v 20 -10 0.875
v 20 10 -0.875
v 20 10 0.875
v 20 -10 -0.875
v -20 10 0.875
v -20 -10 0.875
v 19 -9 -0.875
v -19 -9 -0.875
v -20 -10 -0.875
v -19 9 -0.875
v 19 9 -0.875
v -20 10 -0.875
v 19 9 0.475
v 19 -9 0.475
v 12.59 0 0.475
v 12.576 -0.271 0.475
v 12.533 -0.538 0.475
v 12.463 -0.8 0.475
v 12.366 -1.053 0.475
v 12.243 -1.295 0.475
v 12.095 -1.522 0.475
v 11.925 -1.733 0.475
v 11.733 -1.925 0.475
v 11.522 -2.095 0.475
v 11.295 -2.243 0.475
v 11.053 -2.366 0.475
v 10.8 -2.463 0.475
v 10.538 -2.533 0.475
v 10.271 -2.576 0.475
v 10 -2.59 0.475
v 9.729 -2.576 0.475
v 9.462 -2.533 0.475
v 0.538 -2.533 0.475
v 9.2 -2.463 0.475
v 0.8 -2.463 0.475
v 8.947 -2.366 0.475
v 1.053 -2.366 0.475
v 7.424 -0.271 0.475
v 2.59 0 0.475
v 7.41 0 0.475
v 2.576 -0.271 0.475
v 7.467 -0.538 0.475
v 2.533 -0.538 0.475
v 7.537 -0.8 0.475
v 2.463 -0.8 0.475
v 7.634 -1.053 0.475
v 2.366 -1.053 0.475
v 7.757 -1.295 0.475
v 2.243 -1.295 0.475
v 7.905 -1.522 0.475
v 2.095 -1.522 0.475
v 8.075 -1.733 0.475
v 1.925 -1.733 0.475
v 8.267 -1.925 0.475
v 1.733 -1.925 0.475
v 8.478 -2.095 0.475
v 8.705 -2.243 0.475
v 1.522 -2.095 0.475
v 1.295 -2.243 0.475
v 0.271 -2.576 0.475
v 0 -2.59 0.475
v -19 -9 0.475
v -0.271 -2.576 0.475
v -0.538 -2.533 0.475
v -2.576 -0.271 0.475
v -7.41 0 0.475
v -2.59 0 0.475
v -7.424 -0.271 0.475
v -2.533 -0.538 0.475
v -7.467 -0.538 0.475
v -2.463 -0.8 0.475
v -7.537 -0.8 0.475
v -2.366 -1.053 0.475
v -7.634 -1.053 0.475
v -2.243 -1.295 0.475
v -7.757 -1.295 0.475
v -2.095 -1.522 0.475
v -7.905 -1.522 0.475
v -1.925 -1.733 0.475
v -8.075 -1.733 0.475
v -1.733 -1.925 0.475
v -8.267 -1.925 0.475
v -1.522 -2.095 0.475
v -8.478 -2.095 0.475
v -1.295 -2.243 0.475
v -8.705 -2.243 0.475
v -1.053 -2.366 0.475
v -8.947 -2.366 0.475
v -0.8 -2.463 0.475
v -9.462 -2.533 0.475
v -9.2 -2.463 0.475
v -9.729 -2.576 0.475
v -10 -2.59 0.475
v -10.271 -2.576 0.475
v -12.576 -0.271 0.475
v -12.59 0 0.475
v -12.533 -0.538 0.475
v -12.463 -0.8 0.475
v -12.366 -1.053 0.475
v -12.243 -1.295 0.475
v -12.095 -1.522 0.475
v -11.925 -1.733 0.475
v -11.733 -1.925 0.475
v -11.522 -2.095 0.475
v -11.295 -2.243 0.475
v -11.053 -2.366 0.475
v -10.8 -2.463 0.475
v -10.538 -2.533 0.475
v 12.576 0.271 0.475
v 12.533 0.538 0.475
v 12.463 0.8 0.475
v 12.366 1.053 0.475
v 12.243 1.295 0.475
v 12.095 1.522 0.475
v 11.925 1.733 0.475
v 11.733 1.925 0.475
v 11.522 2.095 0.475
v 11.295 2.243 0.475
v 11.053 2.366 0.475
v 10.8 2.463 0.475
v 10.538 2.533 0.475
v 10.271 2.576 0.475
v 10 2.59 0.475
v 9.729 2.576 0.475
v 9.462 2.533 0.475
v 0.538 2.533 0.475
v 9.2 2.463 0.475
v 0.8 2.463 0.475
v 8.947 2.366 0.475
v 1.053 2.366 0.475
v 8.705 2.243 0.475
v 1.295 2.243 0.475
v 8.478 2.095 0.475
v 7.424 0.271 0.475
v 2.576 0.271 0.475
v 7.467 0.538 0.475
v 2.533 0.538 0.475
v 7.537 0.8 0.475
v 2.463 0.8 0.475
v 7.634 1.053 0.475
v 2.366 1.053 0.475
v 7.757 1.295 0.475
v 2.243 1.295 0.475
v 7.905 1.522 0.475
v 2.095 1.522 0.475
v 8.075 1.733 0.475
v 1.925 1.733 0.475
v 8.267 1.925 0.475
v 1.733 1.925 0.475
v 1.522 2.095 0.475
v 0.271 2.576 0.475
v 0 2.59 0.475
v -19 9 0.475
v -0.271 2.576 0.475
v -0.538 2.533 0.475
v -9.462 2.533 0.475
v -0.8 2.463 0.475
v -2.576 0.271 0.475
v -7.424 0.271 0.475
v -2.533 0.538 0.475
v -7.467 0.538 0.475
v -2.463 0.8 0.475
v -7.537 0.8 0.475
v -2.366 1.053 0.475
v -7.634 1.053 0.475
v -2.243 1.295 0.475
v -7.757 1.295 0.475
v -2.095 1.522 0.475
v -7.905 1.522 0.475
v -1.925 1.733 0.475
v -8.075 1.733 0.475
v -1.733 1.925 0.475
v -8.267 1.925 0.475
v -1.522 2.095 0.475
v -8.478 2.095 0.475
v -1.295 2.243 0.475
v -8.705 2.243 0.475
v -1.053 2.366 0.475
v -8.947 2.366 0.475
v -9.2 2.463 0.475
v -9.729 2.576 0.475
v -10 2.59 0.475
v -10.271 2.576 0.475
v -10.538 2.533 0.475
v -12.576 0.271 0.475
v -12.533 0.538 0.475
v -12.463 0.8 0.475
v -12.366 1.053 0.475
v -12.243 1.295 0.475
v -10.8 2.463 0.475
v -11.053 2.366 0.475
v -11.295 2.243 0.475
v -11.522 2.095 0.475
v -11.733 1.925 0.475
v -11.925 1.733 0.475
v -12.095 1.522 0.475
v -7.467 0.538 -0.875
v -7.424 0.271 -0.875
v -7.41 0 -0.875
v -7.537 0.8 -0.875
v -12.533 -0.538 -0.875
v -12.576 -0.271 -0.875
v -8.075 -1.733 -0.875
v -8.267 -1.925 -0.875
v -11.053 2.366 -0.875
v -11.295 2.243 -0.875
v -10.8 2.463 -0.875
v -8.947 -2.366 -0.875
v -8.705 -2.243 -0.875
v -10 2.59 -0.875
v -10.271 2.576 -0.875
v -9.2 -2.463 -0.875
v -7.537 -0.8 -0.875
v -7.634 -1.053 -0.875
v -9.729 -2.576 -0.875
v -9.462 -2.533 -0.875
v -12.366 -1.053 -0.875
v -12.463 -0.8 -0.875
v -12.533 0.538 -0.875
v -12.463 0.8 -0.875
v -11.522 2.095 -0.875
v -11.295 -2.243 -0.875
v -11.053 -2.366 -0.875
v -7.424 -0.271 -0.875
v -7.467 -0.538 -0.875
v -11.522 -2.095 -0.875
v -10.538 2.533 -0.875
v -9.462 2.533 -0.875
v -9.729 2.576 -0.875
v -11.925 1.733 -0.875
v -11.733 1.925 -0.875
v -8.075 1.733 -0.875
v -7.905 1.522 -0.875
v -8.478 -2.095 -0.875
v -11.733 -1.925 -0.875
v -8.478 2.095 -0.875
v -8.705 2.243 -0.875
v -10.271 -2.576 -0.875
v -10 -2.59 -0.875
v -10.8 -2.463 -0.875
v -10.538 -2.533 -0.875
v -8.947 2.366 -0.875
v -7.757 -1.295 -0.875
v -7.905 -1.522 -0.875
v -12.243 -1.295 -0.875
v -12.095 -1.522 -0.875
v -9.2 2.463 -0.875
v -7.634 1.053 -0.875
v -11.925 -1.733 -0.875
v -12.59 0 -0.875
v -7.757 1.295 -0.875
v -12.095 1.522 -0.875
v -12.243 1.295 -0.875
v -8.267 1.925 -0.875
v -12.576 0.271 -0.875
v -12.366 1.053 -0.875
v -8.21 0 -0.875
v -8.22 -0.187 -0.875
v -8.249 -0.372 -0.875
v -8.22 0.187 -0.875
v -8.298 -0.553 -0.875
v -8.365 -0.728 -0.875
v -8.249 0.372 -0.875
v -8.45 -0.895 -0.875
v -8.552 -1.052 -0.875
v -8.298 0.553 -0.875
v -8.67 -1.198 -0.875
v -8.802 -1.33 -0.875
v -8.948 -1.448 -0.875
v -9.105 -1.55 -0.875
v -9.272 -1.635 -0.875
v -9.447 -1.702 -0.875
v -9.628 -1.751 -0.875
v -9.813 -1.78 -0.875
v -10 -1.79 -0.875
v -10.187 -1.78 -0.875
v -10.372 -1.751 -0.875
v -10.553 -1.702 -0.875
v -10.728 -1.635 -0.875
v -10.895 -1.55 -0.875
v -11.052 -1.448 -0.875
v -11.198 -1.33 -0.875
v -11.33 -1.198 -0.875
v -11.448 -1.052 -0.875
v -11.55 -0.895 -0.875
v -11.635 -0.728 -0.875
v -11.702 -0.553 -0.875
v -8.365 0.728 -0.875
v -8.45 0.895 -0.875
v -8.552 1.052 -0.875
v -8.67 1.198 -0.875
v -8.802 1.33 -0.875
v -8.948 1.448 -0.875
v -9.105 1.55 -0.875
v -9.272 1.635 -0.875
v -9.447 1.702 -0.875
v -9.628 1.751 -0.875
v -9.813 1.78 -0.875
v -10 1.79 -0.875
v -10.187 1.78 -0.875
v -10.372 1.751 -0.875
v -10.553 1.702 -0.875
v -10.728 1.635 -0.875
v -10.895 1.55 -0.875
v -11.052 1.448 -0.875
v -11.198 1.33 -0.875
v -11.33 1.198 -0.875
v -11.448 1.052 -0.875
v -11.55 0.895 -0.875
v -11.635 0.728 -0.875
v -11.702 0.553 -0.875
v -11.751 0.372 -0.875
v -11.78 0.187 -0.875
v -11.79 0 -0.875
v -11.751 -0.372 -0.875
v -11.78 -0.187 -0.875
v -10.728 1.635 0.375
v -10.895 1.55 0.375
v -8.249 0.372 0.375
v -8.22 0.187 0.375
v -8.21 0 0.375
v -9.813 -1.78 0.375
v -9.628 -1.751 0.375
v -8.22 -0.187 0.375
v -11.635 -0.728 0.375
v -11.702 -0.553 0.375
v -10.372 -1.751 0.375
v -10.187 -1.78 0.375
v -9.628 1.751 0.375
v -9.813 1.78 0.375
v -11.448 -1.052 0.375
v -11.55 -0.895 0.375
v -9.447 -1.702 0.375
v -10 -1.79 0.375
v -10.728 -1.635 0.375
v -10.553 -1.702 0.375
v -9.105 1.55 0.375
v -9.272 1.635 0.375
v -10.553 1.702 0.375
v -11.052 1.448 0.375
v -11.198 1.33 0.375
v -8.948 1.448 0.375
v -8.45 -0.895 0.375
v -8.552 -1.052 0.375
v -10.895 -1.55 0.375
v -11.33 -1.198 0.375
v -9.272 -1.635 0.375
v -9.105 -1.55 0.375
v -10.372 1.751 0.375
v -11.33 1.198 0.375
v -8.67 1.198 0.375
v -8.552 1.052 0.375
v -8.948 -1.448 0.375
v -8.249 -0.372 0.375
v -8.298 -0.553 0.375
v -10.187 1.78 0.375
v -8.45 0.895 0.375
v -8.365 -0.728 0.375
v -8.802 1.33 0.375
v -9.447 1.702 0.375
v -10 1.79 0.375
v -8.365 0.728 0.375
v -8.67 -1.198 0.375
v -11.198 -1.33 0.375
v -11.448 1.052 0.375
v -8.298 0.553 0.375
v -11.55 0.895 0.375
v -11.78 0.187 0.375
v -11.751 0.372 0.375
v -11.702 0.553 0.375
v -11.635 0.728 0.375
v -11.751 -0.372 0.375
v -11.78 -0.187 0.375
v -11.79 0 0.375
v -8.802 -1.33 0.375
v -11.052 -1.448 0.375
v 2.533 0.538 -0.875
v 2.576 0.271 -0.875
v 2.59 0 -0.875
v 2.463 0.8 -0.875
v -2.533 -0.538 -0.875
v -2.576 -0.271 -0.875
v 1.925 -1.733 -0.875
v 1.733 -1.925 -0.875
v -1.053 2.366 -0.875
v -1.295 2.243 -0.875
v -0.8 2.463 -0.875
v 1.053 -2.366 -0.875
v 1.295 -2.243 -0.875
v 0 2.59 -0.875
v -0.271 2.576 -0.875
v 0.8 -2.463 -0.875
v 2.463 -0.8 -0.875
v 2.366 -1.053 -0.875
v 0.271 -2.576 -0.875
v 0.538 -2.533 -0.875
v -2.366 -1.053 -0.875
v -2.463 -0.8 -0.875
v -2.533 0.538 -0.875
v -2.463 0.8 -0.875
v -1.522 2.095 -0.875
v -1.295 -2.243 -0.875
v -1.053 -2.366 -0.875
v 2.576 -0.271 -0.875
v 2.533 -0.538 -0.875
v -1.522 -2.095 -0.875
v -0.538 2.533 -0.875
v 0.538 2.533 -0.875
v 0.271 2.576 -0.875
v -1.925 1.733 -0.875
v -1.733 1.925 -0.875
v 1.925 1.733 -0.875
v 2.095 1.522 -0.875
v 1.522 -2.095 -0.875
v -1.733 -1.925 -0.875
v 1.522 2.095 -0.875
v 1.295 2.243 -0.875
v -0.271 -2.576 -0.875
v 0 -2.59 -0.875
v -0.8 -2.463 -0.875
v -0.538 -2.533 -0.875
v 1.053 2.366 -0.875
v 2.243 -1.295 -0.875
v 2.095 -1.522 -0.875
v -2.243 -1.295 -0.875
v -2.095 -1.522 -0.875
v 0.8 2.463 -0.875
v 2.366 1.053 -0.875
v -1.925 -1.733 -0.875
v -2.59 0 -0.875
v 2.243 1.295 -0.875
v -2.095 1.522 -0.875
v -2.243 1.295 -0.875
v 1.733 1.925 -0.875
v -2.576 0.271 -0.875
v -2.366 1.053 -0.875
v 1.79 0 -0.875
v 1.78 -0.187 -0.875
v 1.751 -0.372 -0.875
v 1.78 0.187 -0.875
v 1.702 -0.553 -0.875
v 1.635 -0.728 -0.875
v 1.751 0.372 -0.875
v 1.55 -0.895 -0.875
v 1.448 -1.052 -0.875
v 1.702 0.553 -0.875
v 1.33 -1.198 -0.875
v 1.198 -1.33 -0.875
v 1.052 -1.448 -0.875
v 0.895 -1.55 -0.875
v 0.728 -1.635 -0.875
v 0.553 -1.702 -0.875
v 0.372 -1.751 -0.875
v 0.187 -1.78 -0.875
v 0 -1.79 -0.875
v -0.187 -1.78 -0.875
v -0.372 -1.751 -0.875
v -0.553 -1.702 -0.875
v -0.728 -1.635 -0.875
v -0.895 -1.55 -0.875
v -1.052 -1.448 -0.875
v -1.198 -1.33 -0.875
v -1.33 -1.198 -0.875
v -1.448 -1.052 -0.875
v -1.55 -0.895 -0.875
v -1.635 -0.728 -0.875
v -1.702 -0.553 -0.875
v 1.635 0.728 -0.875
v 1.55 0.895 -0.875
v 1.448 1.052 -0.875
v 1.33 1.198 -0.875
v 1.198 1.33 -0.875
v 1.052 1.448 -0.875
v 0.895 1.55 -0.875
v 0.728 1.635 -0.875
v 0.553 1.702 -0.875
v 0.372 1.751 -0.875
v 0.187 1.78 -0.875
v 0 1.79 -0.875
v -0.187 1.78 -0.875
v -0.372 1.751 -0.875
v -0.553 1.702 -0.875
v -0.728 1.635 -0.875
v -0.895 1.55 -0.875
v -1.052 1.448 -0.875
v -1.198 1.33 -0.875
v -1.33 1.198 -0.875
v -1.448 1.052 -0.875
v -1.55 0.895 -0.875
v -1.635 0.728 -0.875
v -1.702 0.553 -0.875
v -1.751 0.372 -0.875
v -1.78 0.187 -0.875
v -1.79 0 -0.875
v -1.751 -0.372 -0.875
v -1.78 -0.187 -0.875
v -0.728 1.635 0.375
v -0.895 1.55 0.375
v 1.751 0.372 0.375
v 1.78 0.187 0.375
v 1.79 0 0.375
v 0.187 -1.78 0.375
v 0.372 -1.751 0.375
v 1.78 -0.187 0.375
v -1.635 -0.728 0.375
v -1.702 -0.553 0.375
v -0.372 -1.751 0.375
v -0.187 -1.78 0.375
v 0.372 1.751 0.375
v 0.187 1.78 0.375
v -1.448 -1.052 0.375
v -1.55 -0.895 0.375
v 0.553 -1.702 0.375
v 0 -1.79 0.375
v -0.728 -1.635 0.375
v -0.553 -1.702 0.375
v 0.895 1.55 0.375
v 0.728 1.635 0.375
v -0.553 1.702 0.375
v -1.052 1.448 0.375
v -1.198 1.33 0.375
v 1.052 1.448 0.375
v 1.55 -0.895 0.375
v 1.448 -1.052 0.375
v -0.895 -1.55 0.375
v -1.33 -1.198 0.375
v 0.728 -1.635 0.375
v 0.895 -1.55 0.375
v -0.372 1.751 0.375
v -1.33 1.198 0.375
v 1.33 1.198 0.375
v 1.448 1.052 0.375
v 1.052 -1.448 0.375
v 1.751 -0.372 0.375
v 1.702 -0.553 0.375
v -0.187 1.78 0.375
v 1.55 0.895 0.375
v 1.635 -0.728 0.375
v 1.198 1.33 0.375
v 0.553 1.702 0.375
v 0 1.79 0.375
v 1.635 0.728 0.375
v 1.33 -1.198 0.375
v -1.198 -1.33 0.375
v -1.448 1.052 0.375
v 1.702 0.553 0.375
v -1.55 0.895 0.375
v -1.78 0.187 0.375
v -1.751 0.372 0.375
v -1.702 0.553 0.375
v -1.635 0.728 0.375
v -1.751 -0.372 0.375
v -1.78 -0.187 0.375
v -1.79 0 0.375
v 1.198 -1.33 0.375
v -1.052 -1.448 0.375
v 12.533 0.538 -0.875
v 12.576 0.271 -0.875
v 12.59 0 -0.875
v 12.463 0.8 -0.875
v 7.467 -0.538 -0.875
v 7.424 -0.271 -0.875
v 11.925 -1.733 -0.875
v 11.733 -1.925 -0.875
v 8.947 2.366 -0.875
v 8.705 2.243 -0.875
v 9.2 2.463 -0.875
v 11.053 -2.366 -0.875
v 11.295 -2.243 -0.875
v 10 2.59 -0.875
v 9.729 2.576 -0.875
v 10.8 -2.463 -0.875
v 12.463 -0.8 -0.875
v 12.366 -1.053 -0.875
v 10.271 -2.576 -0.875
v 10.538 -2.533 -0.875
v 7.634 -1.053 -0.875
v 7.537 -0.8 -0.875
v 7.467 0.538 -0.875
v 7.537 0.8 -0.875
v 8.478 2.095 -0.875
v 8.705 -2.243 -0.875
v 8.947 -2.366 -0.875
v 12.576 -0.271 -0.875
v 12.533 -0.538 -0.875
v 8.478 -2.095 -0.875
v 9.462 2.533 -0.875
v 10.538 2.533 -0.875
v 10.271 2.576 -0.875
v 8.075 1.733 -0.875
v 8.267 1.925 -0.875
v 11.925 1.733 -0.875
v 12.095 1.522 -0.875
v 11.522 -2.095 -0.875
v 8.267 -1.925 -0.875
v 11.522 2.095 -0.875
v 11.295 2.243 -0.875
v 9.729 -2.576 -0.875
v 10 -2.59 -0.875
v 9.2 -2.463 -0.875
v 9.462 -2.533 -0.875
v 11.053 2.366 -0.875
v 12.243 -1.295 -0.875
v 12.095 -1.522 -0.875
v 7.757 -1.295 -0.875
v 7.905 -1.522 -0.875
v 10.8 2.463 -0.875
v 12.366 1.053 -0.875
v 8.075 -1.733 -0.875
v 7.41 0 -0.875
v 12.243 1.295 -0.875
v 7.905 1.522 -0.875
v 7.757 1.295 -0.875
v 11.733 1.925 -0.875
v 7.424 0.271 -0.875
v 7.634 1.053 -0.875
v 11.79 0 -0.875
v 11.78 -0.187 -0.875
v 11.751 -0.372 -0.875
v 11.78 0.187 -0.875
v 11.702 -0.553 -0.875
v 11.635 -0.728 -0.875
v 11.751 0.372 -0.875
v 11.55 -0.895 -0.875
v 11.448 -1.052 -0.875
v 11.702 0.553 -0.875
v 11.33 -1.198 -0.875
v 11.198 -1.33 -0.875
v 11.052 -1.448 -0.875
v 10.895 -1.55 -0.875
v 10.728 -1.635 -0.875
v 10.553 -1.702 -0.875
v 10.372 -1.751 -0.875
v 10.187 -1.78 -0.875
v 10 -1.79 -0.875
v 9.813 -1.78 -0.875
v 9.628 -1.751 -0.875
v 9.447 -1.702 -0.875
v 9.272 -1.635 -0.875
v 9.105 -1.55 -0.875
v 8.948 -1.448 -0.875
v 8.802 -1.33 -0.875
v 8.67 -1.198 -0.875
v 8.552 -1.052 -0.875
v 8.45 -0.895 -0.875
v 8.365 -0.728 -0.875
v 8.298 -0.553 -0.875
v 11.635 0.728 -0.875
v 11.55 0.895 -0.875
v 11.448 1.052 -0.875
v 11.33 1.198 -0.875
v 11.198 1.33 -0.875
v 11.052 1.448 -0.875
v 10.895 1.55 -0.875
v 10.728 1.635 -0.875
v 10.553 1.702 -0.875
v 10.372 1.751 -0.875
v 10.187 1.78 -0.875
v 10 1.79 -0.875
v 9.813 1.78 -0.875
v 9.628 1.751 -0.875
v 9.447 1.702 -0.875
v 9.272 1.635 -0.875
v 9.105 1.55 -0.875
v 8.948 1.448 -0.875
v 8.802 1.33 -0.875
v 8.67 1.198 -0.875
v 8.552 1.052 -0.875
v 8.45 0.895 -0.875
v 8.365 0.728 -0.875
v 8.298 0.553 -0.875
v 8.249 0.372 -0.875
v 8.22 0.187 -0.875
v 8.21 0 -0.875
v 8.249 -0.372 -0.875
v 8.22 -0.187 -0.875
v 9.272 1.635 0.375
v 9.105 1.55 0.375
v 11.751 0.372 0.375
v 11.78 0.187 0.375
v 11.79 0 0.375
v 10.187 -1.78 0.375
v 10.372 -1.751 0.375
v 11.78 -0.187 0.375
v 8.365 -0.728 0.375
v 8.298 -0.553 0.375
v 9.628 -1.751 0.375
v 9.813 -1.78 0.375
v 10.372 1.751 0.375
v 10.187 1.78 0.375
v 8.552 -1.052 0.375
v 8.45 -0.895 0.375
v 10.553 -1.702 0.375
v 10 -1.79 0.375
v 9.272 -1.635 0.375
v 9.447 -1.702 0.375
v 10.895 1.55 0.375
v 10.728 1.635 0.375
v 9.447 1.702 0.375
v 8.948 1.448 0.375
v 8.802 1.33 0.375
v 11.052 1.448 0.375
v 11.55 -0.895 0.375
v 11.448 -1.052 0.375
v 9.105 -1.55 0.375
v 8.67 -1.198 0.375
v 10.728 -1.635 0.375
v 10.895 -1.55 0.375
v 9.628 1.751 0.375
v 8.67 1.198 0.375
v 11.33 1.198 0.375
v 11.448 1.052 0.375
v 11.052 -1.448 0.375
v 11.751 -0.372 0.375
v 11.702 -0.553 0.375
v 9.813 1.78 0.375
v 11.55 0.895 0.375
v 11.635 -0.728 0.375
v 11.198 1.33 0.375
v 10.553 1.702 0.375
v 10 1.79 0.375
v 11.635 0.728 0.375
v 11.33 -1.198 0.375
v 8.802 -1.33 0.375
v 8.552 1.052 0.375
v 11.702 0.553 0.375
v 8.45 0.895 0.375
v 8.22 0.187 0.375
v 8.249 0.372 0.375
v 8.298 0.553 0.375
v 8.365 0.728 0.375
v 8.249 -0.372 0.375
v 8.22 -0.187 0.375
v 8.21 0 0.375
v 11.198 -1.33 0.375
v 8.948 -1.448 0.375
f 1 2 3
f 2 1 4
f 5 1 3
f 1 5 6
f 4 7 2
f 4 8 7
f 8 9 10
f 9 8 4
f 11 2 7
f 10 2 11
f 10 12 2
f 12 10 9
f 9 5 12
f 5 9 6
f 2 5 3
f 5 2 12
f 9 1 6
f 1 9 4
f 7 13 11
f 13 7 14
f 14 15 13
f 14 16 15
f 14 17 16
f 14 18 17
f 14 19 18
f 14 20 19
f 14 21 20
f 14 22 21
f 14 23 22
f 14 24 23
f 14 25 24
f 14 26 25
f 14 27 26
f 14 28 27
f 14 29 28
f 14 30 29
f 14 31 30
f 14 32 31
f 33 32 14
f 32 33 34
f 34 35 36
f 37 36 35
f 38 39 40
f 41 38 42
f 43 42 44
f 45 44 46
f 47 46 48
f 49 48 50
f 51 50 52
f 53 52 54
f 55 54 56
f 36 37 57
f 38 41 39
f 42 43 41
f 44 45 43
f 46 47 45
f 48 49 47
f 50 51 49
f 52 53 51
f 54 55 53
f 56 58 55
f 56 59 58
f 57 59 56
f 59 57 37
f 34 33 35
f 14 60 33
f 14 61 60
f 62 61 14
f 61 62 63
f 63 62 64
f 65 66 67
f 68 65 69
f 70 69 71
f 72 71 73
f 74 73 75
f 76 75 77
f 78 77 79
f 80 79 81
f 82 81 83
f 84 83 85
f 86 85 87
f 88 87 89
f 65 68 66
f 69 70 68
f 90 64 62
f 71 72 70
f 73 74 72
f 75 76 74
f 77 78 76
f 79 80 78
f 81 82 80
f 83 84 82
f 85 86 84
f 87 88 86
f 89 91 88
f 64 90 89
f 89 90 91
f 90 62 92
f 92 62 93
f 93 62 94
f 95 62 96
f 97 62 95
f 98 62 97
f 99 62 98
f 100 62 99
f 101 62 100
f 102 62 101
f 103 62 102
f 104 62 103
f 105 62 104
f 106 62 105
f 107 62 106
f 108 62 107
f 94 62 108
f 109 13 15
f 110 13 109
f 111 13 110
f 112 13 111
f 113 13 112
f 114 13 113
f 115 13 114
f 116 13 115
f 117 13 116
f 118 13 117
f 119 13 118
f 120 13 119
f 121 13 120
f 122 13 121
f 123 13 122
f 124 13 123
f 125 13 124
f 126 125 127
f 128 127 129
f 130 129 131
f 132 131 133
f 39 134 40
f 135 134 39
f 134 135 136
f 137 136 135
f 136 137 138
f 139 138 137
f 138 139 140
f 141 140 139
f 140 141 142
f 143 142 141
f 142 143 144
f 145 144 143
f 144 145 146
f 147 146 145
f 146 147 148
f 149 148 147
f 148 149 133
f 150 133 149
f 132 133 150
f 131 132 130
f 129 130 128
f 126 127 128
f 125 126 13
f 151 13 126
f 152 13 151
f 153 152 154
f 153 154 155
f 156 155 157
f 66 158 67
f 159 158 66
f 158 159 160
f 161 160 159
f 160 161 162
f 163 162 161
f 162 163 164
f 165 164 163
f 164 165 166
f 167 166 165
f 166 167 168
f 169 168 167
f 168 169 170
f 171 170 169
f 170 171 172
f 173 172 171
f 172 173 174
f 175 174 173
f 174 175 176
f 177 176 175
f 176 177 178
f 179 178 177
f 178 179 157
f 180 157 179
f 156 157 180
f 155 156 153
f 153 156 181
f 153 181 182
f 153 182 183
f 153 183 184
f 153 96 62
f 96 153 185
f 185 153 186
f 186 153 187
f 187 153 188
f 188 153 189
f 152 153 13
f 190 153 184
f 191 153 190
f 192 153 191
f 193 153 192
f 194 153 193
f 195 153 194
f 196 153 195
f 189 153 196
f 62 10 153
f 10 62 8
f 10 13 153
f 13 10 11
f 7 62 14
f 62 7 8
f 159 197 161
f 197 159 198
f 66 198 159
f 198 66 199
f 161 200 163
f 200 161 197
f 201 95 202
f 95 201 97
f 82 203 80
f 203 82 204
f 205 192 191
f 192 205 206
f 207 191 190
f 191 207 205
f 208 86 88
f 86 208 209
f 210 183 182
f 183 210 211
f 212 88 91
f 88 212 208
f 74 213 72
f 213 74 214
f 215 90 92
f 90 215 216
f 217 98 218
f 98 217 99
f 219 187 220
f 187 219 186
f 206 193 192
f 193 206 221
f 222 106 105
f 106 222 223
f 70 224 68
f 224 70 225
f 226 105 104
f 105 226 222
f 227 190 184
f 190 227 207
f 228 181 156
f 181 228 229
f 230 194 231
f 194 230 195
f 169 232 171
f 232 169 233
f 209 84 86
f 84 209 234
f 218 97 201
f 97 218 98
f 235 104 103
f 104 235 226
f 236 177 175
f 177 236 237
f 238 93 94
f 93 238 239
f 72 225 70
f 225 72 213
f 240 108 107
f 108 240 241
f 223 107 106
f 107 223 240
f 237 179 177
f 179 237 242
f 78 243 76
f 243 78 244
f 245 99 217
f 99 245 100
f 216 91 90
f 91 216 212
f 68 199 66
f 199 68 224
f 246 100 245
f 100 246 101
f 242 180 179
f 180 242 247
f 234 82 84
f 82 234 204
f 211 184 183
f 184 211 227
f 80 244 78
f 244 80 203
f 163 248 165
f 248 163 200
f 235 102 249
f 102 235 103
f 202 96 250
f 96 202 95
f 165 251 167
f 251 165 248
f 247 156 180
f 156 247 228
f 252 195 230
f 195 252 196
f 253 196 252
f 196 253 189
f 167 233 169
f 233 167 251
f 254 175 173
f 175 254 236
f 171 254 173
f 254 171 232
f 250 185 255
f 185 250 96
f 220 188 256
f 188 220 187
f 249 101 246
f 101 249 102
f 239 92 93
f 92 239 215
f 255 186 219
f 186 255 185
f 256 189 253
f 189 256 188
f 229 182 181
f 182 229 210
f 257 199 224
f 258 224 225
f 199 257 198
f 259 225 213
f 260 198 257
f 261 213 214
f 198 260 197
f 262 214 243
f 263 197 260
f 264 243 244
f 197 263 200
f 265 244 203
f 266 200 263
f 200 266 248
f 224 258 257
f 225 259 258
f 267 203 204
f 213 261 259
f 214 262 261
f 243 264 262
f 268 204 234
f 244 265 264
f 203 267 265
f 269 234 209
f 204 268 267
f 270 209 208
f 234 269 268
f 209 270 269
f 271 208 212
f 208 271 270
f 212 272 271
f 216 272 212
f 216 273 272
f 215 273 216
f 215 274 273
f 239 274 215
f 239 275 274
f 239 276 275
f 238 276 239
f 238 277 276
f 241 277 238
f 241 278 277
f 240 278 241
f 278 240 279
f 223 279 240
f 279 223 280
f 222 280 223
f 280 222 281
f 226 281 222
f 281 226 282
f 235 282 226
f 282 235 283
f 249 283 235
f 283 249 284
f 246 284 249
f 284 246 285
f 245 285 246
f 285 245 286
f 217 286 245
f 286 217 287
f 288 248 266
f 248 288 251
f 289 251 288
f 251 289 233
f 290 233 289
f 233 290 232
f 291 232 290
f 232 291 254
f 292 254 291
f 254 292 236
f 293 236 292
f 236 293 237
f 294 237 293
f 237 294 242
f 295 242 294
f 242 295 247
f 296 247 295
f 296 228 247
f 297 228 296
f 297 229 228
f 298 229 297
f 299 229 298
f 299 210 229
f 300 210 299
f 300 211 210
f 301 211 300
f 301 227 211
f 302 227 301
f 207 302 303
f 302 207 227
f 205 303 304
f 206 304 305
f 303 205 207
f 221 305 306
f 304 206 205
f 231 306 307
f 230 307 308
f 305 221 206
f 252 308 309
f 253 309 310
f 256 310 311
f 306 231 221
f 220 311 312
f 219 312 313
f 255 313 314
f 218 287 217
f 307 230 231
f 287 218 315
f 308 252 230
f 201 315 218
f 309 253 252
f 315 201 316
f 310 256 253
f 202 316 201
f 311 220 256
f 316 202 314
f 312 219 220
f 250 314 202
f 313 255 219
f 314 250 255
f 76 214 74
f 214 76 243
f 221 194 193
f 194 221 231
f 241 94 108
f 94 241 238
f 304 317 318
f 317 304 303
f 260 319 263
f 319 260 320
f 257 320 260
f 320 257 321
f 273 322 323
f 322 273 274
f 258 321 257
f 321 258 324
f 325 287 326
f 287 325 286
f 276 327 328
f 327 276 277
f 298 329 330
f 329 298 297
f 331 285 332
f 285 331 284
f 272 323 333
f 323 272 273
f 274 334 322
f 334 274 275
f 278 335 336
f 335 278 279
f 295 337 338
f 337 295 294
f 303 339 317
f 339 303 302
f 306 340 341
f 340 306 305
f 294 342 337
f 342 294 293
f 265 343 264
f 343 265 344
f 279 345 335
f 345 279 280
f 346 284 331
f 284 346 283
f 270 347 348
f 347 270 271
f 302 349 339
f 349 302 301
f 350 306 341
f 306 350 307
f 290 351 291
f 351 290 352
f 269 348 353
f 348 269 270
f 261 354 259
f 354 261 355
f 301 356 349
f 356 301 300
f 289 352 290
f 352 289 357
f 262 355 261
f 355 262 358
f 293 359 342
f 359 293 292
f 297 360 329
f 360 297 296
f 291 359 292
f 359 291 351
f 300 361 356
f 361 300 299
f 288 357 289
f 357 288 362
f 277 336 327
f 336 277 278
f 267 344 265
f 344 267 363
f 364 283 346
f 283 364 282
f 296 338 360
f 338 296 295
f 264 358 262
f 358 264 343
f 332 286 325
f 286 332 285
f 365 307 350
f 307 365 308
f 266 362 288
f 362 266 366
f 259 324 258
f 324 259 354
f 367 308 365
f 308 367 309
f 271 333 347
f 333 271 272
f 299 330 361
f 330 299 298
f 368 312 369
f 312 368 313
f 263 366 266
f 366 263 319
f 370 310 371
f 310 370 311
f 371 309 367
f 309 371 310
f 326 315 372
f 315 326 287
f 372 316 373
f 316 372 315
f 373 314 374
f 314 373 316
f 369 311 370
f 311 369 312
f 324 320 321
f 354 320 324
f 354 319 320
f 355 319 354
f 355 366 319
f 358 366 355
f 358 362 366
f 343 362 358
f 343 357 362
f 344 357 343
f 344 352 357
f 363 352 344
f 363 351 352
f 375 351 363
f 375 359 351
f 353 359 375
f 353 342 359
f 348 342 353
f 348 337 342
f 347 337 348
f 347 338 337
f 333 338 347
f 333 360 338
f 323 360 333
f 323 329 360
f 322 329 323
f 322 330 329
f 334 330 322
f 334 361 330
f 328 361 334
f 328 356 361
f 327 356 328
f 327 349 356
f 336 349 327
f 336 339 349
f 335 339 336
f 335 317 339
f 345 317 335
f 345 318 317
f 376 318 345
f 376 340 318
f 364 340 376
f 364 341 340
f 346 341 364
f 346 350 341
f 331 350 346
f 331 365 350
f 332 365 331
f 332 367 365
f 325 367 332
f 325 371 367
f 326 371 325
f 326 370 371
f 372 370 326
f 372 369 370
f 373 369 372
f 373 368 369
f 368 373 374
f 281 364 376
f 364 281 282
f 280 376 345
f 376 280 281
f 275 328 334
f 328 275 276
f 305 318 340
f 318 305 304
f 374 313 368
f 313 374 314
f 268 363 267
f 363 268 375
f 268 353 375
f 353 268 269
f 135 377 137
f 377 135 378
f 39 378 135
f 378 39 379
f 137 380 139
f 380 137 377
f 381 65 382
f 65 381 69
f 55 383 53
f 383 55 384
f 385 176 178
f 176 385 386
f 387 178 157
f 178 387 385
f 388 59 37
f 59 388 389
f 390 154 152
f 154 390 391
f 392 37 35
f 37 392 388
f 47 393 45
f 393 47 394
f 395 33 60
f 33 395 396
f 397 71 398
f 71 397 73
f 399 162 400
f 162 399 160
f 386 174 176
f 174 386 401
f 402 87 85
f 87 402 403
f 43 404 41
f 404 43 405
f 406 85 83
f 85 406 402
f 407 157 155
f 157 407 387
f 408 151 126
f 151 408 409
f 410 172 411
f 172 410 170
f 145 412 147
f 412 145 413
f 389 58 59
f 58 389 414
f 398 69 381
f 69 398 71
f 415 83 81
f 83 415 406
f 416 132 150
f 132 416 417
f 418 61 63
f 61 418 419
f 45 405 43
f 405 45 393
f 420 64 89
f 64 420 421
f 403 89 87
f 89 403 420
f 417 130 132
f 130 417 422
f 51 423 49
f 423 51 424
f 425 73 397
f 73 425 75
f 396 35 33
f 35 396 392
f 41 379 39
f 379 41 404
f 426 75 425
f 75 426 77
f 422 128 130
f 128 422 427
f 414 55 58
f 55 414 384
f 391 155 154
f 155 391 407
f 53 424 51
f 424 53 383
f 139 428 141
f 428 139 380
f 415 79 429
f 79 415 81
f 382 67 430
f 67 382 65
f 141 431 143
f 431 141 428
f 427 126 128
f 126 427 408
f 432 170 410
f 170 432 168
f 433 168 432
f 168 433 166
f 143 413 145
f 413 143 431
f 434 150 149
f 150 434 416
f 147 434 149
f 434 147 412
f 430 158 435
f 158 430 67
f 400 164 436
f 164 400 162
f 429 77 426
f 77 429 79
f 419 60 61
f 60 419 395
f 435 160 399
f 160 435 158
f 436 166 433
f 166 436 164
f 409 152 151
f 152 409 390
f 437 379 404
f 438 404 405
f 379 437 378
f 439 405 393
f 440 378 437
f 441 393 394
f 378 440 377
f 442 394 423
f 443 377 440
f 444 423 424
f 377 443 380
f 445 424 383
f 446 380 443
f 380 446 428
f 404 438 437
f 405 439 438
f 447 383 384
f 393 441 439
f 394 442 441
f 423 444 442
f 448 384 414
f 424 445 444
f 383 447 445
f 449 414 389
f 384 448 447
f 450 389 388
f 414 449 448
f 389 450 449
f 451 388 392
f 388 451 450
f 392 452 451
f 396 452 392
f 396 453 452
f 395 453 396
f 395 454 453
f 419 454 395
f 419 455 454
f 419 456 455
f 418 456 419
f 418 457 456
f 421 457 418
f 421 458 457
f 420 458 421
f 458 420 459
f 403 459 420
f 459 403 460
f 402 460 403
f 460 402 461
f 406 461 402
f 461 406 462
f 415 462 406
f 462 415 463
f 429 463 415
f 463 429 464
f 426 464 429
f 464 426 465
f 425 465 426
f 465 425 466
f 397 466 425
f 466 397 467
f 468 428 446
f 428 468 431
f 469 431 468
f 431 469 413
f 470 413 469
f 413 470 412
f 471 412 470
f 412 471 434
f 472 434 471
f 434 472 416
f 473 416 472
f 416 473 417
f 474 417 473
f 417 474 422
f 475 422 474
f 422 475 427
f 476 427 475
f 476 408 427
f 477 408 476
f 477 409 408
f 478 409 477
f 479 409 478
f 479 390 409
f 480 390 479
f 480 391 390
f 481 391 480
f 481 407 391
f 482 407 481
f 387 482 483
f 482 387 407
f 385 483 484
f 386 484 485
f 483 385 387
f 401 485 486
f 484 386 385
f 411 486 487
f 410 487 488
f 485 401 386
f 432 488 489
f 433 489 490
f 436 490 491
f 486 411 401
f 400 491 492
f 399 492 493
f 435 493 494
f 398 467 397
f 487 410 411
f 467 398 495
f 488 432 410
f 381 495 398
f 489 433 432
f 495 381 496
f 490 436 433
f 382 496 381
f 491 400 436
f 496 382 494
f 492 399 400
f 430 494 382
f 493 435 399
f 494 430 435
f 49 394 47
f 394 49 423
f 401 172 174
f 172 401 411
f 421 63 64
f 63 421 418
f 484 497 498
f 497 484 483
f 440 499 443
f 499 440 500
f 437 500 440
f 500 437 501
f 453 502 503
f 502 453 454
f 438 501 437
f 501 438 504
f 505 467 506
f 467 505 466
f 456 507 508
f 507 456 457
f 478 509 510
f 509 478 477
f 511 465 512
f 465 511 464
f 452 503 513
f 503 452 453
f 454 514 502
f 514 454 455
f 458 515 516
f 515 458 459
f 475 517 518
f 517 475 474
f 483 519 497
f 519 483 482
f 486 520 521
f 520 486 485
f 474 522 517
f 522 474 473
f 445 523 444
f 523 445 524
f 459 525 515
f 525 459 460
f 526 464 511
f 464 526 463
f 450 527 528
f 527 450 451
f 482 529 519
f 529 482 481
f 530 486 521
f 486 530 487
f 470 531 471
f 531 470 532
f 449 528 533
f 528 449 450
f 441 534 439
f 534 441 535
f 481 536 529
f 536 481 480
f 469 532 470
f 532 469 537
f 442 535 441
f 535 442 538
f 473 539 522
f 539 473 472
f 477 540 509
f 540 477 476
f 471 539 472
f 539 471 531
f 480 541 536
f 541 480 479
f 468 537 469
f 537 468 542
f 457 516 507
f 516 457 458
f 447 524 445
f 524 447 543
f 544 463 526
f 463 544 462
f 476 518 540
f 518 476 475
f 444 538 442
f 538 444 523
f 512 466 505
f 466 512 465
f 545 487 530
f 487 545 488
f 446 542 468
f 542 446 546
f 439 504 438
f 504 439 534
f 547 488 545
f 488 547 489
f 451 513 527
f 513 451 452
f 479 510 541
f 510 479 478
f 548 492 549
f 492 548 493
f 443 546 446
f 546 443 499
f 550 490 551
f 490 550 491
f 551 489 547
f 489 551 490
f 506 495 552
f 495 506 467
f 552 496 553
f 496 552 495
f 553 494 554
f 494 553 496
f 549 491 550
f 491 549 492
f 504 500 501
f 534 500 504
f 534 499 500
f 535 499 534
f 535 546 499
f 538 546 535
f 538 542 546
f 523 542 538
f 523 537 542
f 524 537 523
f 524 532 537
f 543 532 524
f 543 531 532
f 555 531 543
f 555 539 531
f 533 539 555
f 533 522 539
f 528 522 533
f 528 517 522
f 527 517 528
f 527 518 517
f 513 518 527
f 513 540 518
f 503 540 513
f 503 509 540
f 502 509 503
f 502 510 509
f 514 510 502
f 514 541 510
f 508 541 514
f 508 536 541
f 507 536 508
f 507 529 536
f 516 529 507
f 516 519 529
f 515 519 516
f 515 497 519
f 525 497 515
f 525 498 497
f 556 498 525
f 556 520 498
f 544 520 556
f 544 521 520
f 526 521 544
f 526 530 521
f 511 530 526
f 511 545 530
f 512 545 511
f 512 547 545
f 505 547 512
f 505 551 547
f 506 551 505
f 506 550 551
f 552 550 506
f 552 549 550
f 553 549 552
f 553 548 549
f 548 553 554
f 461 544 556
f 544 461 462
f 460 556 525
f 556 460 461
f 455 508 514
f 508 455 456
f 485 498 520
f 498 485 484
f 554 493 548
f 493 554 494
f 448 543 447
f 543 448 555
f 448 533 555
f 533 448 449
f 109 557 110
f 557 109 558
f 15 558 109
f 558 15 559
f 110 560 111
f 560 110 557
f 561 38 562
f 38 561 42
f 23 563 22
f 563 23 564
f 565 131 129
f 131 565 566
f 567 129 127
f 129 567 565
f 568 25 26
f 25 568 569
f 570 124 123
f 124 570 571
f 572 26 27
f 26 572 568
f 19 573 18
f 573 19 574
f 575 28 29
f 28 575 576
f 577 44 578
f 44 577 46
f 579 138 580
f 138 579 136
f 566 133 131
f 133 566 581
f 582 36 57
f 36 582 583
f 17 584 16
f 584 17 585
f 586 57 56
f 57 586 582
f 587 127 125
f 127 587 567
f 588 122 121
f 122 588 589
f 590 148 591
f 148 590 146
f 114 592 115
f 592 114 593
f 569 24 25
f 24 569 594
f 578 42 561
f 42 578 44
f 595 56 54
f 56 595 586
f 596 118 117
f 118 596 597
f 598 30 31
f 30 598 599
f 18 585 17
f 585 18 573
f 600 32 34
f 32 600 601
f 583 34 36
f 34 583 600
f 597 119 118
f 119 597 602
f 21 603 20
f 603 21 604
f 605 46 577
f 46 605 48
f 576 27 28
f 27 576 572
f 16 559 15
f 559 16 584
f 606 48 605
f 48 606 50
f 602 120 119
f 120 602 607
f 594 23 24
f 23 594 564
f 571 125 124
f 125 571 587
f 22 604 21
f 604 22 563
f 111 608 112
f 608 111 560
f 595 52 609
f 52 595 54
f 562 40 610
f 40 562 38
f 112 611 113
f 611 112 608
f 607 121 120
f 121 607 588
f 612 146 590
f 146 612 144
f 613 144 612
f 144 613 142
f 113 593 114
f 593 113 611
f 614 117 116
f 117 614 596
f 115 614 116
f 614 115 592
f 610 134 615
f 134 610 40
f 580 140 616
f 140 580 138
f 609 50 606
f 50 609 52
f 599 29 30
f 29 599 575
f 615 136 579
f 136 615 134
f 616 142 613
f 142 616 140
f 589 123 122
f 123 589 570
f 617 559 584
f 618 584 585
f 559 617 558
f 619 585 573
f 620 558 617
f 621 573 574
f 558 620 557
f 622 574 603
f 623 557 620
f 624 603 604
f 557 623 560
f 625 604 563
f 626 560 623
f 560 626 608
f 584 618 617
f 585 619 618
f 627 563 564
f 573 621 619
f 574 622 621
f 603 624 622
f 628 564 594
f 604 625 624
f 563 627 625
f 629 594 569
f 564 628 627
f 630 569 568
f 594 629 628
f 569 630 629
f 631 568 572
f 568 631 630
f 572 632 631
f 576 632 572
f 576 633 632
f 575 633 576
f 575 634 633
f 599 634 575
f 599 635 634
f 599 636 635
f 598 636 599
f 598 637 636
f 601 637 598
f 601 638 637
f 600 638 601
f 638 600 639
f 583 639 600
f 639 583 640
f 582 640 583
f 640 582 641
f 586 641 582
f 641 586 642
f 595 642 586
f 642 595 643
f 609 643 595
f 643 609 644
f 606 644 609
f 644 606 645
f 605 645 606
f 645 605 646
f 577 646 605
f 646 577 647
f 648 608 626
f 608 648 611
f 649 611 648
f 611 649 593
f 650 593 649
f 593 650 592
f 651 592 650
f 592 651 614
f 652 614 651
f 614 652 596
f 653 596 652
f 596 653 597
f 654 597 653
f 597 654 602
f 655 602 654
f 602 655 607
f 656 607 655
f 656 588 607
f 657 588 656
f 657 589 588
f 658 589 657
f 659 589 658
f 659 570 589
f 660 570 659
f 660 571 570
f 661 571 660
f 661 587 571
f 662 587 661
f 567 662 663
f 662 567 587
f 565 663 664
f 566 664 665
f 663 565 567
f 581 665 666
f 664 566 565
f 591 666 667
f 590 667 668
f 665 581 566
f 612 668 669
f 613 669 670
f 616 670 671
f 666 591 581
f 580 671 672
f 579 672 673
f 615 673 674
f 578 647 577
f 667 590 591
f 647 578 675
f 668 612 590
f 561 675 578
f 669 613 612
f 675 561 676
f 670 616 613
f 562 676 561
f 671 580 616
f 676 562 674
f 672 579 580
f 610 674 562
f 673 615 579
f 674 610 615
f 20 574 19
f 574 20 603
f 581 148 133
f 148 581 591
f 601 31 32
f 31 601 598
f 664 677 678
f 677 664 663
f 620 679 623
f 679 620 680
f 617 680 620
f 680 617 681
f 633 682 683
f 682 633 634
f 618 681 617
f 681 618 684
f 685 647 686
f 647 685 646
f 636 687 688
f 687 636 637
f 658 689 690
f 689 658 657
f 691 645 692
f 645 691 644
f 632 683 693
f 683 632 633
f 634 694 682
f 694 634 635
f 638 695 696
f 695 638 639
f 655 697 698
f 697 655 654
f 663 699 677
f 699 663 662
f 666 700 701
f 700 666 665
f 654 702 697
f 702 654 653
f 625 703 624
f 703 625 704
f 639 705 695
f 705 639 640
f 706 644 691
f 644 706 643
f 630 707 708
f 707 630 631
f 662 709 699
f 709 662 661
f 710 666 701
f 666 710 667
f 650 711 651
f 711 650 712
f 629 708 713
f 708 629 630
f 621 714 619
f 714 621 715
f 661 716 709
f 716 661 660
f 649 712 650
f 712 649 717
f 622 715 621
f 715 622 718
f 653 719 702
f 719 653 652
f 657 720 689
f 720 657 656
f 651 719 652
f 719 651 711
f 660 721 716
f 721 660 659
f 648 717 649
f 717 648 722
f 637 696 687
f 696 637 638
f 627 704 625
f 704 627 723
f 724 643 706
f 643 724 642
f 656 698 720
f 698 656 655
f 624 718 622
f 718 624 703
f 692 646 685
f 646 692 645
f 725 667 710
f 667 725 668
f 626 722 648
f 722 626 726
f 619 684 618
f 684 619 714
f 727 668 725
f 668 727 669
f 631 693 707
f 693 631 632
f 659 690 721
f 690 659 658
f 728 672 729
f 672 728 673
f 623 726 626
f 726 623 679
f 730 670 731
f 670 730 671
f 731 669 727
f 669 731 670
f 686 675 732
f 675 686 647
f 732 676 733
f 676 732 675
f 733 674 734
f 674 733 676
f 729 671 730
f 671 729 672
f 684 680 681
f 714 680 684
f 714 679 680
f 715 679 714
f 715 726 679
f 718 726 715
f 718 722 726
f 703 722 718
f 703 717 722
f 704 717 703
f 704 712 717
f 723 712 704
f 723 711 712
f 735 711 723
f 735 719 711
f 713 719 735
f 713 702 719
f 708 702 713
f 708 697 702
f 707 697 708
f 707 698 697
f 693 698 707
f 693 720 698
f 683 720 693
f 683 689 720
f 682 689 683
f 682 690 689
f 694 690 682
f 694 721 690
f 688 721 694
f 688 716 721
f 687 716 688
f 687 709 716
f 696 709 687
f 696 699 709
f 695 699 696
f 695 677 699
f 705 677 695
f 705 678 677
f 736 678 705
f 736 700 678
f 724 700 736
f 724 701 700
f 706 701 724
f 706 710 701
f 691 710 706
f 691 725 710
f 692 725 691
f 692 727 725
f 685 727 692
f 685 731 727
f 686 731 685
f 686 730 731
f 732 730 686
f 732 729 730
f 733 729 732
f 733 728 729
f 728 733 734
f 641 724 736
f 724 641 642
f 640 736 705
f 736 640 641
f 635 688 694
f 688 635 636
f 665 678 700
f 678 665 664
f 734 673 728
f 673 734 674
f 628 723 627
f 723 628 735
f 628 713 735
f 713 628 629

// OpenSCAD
//
// bases/warhammer_fantasy_no_bevel.scad

// Copyright (C) 2025 John Mettraux jmettraux@gmail.com
//
// This work is licensed under the
// Creative Commons Attribution 4.0 International License.
//
// https://creativecommons.org/licenses/by/4.0/

$fn = 60;
//$fn = 120;
//$fn = 240;
  // circle facet count, set to 120 or 360 for "round"

// unit is millimeter (except for the size variable)

length = 40;
width = 20;
height = 1.4 + 0.35;
gap = 1.0;
g2 = 2 * gap;

magnet_height = 1.0 + 0.3; // +0.2 resin / +0.3 pla
magnet_radius = 1.5 + 0.29; // +0.1 resin / +0.29 pla

difference() {

  cube([ length, width, height ], center = true);

  translate([ 0, 0, -0.4 ])
    cube([ length - g2, width - g2, height ], center = true);
}

module magnet_holder() {
  difference() {
    cylinder(h = height, r = magnet_radius + 0.8, center = true);
    translate([ 0, 0, - height / 2 + magnet_height / 2 - 0.1 ])
      cylinder(h = magnet_height + 0.1, r = magnet_radius, center = true);
  }
}

translate([ -10, 0, 0 ]) magnet_holder();
translate([   0, 0, 0 ]) magnet_holder();
translate([  10, 0, 0 ]) magnet_holder();
